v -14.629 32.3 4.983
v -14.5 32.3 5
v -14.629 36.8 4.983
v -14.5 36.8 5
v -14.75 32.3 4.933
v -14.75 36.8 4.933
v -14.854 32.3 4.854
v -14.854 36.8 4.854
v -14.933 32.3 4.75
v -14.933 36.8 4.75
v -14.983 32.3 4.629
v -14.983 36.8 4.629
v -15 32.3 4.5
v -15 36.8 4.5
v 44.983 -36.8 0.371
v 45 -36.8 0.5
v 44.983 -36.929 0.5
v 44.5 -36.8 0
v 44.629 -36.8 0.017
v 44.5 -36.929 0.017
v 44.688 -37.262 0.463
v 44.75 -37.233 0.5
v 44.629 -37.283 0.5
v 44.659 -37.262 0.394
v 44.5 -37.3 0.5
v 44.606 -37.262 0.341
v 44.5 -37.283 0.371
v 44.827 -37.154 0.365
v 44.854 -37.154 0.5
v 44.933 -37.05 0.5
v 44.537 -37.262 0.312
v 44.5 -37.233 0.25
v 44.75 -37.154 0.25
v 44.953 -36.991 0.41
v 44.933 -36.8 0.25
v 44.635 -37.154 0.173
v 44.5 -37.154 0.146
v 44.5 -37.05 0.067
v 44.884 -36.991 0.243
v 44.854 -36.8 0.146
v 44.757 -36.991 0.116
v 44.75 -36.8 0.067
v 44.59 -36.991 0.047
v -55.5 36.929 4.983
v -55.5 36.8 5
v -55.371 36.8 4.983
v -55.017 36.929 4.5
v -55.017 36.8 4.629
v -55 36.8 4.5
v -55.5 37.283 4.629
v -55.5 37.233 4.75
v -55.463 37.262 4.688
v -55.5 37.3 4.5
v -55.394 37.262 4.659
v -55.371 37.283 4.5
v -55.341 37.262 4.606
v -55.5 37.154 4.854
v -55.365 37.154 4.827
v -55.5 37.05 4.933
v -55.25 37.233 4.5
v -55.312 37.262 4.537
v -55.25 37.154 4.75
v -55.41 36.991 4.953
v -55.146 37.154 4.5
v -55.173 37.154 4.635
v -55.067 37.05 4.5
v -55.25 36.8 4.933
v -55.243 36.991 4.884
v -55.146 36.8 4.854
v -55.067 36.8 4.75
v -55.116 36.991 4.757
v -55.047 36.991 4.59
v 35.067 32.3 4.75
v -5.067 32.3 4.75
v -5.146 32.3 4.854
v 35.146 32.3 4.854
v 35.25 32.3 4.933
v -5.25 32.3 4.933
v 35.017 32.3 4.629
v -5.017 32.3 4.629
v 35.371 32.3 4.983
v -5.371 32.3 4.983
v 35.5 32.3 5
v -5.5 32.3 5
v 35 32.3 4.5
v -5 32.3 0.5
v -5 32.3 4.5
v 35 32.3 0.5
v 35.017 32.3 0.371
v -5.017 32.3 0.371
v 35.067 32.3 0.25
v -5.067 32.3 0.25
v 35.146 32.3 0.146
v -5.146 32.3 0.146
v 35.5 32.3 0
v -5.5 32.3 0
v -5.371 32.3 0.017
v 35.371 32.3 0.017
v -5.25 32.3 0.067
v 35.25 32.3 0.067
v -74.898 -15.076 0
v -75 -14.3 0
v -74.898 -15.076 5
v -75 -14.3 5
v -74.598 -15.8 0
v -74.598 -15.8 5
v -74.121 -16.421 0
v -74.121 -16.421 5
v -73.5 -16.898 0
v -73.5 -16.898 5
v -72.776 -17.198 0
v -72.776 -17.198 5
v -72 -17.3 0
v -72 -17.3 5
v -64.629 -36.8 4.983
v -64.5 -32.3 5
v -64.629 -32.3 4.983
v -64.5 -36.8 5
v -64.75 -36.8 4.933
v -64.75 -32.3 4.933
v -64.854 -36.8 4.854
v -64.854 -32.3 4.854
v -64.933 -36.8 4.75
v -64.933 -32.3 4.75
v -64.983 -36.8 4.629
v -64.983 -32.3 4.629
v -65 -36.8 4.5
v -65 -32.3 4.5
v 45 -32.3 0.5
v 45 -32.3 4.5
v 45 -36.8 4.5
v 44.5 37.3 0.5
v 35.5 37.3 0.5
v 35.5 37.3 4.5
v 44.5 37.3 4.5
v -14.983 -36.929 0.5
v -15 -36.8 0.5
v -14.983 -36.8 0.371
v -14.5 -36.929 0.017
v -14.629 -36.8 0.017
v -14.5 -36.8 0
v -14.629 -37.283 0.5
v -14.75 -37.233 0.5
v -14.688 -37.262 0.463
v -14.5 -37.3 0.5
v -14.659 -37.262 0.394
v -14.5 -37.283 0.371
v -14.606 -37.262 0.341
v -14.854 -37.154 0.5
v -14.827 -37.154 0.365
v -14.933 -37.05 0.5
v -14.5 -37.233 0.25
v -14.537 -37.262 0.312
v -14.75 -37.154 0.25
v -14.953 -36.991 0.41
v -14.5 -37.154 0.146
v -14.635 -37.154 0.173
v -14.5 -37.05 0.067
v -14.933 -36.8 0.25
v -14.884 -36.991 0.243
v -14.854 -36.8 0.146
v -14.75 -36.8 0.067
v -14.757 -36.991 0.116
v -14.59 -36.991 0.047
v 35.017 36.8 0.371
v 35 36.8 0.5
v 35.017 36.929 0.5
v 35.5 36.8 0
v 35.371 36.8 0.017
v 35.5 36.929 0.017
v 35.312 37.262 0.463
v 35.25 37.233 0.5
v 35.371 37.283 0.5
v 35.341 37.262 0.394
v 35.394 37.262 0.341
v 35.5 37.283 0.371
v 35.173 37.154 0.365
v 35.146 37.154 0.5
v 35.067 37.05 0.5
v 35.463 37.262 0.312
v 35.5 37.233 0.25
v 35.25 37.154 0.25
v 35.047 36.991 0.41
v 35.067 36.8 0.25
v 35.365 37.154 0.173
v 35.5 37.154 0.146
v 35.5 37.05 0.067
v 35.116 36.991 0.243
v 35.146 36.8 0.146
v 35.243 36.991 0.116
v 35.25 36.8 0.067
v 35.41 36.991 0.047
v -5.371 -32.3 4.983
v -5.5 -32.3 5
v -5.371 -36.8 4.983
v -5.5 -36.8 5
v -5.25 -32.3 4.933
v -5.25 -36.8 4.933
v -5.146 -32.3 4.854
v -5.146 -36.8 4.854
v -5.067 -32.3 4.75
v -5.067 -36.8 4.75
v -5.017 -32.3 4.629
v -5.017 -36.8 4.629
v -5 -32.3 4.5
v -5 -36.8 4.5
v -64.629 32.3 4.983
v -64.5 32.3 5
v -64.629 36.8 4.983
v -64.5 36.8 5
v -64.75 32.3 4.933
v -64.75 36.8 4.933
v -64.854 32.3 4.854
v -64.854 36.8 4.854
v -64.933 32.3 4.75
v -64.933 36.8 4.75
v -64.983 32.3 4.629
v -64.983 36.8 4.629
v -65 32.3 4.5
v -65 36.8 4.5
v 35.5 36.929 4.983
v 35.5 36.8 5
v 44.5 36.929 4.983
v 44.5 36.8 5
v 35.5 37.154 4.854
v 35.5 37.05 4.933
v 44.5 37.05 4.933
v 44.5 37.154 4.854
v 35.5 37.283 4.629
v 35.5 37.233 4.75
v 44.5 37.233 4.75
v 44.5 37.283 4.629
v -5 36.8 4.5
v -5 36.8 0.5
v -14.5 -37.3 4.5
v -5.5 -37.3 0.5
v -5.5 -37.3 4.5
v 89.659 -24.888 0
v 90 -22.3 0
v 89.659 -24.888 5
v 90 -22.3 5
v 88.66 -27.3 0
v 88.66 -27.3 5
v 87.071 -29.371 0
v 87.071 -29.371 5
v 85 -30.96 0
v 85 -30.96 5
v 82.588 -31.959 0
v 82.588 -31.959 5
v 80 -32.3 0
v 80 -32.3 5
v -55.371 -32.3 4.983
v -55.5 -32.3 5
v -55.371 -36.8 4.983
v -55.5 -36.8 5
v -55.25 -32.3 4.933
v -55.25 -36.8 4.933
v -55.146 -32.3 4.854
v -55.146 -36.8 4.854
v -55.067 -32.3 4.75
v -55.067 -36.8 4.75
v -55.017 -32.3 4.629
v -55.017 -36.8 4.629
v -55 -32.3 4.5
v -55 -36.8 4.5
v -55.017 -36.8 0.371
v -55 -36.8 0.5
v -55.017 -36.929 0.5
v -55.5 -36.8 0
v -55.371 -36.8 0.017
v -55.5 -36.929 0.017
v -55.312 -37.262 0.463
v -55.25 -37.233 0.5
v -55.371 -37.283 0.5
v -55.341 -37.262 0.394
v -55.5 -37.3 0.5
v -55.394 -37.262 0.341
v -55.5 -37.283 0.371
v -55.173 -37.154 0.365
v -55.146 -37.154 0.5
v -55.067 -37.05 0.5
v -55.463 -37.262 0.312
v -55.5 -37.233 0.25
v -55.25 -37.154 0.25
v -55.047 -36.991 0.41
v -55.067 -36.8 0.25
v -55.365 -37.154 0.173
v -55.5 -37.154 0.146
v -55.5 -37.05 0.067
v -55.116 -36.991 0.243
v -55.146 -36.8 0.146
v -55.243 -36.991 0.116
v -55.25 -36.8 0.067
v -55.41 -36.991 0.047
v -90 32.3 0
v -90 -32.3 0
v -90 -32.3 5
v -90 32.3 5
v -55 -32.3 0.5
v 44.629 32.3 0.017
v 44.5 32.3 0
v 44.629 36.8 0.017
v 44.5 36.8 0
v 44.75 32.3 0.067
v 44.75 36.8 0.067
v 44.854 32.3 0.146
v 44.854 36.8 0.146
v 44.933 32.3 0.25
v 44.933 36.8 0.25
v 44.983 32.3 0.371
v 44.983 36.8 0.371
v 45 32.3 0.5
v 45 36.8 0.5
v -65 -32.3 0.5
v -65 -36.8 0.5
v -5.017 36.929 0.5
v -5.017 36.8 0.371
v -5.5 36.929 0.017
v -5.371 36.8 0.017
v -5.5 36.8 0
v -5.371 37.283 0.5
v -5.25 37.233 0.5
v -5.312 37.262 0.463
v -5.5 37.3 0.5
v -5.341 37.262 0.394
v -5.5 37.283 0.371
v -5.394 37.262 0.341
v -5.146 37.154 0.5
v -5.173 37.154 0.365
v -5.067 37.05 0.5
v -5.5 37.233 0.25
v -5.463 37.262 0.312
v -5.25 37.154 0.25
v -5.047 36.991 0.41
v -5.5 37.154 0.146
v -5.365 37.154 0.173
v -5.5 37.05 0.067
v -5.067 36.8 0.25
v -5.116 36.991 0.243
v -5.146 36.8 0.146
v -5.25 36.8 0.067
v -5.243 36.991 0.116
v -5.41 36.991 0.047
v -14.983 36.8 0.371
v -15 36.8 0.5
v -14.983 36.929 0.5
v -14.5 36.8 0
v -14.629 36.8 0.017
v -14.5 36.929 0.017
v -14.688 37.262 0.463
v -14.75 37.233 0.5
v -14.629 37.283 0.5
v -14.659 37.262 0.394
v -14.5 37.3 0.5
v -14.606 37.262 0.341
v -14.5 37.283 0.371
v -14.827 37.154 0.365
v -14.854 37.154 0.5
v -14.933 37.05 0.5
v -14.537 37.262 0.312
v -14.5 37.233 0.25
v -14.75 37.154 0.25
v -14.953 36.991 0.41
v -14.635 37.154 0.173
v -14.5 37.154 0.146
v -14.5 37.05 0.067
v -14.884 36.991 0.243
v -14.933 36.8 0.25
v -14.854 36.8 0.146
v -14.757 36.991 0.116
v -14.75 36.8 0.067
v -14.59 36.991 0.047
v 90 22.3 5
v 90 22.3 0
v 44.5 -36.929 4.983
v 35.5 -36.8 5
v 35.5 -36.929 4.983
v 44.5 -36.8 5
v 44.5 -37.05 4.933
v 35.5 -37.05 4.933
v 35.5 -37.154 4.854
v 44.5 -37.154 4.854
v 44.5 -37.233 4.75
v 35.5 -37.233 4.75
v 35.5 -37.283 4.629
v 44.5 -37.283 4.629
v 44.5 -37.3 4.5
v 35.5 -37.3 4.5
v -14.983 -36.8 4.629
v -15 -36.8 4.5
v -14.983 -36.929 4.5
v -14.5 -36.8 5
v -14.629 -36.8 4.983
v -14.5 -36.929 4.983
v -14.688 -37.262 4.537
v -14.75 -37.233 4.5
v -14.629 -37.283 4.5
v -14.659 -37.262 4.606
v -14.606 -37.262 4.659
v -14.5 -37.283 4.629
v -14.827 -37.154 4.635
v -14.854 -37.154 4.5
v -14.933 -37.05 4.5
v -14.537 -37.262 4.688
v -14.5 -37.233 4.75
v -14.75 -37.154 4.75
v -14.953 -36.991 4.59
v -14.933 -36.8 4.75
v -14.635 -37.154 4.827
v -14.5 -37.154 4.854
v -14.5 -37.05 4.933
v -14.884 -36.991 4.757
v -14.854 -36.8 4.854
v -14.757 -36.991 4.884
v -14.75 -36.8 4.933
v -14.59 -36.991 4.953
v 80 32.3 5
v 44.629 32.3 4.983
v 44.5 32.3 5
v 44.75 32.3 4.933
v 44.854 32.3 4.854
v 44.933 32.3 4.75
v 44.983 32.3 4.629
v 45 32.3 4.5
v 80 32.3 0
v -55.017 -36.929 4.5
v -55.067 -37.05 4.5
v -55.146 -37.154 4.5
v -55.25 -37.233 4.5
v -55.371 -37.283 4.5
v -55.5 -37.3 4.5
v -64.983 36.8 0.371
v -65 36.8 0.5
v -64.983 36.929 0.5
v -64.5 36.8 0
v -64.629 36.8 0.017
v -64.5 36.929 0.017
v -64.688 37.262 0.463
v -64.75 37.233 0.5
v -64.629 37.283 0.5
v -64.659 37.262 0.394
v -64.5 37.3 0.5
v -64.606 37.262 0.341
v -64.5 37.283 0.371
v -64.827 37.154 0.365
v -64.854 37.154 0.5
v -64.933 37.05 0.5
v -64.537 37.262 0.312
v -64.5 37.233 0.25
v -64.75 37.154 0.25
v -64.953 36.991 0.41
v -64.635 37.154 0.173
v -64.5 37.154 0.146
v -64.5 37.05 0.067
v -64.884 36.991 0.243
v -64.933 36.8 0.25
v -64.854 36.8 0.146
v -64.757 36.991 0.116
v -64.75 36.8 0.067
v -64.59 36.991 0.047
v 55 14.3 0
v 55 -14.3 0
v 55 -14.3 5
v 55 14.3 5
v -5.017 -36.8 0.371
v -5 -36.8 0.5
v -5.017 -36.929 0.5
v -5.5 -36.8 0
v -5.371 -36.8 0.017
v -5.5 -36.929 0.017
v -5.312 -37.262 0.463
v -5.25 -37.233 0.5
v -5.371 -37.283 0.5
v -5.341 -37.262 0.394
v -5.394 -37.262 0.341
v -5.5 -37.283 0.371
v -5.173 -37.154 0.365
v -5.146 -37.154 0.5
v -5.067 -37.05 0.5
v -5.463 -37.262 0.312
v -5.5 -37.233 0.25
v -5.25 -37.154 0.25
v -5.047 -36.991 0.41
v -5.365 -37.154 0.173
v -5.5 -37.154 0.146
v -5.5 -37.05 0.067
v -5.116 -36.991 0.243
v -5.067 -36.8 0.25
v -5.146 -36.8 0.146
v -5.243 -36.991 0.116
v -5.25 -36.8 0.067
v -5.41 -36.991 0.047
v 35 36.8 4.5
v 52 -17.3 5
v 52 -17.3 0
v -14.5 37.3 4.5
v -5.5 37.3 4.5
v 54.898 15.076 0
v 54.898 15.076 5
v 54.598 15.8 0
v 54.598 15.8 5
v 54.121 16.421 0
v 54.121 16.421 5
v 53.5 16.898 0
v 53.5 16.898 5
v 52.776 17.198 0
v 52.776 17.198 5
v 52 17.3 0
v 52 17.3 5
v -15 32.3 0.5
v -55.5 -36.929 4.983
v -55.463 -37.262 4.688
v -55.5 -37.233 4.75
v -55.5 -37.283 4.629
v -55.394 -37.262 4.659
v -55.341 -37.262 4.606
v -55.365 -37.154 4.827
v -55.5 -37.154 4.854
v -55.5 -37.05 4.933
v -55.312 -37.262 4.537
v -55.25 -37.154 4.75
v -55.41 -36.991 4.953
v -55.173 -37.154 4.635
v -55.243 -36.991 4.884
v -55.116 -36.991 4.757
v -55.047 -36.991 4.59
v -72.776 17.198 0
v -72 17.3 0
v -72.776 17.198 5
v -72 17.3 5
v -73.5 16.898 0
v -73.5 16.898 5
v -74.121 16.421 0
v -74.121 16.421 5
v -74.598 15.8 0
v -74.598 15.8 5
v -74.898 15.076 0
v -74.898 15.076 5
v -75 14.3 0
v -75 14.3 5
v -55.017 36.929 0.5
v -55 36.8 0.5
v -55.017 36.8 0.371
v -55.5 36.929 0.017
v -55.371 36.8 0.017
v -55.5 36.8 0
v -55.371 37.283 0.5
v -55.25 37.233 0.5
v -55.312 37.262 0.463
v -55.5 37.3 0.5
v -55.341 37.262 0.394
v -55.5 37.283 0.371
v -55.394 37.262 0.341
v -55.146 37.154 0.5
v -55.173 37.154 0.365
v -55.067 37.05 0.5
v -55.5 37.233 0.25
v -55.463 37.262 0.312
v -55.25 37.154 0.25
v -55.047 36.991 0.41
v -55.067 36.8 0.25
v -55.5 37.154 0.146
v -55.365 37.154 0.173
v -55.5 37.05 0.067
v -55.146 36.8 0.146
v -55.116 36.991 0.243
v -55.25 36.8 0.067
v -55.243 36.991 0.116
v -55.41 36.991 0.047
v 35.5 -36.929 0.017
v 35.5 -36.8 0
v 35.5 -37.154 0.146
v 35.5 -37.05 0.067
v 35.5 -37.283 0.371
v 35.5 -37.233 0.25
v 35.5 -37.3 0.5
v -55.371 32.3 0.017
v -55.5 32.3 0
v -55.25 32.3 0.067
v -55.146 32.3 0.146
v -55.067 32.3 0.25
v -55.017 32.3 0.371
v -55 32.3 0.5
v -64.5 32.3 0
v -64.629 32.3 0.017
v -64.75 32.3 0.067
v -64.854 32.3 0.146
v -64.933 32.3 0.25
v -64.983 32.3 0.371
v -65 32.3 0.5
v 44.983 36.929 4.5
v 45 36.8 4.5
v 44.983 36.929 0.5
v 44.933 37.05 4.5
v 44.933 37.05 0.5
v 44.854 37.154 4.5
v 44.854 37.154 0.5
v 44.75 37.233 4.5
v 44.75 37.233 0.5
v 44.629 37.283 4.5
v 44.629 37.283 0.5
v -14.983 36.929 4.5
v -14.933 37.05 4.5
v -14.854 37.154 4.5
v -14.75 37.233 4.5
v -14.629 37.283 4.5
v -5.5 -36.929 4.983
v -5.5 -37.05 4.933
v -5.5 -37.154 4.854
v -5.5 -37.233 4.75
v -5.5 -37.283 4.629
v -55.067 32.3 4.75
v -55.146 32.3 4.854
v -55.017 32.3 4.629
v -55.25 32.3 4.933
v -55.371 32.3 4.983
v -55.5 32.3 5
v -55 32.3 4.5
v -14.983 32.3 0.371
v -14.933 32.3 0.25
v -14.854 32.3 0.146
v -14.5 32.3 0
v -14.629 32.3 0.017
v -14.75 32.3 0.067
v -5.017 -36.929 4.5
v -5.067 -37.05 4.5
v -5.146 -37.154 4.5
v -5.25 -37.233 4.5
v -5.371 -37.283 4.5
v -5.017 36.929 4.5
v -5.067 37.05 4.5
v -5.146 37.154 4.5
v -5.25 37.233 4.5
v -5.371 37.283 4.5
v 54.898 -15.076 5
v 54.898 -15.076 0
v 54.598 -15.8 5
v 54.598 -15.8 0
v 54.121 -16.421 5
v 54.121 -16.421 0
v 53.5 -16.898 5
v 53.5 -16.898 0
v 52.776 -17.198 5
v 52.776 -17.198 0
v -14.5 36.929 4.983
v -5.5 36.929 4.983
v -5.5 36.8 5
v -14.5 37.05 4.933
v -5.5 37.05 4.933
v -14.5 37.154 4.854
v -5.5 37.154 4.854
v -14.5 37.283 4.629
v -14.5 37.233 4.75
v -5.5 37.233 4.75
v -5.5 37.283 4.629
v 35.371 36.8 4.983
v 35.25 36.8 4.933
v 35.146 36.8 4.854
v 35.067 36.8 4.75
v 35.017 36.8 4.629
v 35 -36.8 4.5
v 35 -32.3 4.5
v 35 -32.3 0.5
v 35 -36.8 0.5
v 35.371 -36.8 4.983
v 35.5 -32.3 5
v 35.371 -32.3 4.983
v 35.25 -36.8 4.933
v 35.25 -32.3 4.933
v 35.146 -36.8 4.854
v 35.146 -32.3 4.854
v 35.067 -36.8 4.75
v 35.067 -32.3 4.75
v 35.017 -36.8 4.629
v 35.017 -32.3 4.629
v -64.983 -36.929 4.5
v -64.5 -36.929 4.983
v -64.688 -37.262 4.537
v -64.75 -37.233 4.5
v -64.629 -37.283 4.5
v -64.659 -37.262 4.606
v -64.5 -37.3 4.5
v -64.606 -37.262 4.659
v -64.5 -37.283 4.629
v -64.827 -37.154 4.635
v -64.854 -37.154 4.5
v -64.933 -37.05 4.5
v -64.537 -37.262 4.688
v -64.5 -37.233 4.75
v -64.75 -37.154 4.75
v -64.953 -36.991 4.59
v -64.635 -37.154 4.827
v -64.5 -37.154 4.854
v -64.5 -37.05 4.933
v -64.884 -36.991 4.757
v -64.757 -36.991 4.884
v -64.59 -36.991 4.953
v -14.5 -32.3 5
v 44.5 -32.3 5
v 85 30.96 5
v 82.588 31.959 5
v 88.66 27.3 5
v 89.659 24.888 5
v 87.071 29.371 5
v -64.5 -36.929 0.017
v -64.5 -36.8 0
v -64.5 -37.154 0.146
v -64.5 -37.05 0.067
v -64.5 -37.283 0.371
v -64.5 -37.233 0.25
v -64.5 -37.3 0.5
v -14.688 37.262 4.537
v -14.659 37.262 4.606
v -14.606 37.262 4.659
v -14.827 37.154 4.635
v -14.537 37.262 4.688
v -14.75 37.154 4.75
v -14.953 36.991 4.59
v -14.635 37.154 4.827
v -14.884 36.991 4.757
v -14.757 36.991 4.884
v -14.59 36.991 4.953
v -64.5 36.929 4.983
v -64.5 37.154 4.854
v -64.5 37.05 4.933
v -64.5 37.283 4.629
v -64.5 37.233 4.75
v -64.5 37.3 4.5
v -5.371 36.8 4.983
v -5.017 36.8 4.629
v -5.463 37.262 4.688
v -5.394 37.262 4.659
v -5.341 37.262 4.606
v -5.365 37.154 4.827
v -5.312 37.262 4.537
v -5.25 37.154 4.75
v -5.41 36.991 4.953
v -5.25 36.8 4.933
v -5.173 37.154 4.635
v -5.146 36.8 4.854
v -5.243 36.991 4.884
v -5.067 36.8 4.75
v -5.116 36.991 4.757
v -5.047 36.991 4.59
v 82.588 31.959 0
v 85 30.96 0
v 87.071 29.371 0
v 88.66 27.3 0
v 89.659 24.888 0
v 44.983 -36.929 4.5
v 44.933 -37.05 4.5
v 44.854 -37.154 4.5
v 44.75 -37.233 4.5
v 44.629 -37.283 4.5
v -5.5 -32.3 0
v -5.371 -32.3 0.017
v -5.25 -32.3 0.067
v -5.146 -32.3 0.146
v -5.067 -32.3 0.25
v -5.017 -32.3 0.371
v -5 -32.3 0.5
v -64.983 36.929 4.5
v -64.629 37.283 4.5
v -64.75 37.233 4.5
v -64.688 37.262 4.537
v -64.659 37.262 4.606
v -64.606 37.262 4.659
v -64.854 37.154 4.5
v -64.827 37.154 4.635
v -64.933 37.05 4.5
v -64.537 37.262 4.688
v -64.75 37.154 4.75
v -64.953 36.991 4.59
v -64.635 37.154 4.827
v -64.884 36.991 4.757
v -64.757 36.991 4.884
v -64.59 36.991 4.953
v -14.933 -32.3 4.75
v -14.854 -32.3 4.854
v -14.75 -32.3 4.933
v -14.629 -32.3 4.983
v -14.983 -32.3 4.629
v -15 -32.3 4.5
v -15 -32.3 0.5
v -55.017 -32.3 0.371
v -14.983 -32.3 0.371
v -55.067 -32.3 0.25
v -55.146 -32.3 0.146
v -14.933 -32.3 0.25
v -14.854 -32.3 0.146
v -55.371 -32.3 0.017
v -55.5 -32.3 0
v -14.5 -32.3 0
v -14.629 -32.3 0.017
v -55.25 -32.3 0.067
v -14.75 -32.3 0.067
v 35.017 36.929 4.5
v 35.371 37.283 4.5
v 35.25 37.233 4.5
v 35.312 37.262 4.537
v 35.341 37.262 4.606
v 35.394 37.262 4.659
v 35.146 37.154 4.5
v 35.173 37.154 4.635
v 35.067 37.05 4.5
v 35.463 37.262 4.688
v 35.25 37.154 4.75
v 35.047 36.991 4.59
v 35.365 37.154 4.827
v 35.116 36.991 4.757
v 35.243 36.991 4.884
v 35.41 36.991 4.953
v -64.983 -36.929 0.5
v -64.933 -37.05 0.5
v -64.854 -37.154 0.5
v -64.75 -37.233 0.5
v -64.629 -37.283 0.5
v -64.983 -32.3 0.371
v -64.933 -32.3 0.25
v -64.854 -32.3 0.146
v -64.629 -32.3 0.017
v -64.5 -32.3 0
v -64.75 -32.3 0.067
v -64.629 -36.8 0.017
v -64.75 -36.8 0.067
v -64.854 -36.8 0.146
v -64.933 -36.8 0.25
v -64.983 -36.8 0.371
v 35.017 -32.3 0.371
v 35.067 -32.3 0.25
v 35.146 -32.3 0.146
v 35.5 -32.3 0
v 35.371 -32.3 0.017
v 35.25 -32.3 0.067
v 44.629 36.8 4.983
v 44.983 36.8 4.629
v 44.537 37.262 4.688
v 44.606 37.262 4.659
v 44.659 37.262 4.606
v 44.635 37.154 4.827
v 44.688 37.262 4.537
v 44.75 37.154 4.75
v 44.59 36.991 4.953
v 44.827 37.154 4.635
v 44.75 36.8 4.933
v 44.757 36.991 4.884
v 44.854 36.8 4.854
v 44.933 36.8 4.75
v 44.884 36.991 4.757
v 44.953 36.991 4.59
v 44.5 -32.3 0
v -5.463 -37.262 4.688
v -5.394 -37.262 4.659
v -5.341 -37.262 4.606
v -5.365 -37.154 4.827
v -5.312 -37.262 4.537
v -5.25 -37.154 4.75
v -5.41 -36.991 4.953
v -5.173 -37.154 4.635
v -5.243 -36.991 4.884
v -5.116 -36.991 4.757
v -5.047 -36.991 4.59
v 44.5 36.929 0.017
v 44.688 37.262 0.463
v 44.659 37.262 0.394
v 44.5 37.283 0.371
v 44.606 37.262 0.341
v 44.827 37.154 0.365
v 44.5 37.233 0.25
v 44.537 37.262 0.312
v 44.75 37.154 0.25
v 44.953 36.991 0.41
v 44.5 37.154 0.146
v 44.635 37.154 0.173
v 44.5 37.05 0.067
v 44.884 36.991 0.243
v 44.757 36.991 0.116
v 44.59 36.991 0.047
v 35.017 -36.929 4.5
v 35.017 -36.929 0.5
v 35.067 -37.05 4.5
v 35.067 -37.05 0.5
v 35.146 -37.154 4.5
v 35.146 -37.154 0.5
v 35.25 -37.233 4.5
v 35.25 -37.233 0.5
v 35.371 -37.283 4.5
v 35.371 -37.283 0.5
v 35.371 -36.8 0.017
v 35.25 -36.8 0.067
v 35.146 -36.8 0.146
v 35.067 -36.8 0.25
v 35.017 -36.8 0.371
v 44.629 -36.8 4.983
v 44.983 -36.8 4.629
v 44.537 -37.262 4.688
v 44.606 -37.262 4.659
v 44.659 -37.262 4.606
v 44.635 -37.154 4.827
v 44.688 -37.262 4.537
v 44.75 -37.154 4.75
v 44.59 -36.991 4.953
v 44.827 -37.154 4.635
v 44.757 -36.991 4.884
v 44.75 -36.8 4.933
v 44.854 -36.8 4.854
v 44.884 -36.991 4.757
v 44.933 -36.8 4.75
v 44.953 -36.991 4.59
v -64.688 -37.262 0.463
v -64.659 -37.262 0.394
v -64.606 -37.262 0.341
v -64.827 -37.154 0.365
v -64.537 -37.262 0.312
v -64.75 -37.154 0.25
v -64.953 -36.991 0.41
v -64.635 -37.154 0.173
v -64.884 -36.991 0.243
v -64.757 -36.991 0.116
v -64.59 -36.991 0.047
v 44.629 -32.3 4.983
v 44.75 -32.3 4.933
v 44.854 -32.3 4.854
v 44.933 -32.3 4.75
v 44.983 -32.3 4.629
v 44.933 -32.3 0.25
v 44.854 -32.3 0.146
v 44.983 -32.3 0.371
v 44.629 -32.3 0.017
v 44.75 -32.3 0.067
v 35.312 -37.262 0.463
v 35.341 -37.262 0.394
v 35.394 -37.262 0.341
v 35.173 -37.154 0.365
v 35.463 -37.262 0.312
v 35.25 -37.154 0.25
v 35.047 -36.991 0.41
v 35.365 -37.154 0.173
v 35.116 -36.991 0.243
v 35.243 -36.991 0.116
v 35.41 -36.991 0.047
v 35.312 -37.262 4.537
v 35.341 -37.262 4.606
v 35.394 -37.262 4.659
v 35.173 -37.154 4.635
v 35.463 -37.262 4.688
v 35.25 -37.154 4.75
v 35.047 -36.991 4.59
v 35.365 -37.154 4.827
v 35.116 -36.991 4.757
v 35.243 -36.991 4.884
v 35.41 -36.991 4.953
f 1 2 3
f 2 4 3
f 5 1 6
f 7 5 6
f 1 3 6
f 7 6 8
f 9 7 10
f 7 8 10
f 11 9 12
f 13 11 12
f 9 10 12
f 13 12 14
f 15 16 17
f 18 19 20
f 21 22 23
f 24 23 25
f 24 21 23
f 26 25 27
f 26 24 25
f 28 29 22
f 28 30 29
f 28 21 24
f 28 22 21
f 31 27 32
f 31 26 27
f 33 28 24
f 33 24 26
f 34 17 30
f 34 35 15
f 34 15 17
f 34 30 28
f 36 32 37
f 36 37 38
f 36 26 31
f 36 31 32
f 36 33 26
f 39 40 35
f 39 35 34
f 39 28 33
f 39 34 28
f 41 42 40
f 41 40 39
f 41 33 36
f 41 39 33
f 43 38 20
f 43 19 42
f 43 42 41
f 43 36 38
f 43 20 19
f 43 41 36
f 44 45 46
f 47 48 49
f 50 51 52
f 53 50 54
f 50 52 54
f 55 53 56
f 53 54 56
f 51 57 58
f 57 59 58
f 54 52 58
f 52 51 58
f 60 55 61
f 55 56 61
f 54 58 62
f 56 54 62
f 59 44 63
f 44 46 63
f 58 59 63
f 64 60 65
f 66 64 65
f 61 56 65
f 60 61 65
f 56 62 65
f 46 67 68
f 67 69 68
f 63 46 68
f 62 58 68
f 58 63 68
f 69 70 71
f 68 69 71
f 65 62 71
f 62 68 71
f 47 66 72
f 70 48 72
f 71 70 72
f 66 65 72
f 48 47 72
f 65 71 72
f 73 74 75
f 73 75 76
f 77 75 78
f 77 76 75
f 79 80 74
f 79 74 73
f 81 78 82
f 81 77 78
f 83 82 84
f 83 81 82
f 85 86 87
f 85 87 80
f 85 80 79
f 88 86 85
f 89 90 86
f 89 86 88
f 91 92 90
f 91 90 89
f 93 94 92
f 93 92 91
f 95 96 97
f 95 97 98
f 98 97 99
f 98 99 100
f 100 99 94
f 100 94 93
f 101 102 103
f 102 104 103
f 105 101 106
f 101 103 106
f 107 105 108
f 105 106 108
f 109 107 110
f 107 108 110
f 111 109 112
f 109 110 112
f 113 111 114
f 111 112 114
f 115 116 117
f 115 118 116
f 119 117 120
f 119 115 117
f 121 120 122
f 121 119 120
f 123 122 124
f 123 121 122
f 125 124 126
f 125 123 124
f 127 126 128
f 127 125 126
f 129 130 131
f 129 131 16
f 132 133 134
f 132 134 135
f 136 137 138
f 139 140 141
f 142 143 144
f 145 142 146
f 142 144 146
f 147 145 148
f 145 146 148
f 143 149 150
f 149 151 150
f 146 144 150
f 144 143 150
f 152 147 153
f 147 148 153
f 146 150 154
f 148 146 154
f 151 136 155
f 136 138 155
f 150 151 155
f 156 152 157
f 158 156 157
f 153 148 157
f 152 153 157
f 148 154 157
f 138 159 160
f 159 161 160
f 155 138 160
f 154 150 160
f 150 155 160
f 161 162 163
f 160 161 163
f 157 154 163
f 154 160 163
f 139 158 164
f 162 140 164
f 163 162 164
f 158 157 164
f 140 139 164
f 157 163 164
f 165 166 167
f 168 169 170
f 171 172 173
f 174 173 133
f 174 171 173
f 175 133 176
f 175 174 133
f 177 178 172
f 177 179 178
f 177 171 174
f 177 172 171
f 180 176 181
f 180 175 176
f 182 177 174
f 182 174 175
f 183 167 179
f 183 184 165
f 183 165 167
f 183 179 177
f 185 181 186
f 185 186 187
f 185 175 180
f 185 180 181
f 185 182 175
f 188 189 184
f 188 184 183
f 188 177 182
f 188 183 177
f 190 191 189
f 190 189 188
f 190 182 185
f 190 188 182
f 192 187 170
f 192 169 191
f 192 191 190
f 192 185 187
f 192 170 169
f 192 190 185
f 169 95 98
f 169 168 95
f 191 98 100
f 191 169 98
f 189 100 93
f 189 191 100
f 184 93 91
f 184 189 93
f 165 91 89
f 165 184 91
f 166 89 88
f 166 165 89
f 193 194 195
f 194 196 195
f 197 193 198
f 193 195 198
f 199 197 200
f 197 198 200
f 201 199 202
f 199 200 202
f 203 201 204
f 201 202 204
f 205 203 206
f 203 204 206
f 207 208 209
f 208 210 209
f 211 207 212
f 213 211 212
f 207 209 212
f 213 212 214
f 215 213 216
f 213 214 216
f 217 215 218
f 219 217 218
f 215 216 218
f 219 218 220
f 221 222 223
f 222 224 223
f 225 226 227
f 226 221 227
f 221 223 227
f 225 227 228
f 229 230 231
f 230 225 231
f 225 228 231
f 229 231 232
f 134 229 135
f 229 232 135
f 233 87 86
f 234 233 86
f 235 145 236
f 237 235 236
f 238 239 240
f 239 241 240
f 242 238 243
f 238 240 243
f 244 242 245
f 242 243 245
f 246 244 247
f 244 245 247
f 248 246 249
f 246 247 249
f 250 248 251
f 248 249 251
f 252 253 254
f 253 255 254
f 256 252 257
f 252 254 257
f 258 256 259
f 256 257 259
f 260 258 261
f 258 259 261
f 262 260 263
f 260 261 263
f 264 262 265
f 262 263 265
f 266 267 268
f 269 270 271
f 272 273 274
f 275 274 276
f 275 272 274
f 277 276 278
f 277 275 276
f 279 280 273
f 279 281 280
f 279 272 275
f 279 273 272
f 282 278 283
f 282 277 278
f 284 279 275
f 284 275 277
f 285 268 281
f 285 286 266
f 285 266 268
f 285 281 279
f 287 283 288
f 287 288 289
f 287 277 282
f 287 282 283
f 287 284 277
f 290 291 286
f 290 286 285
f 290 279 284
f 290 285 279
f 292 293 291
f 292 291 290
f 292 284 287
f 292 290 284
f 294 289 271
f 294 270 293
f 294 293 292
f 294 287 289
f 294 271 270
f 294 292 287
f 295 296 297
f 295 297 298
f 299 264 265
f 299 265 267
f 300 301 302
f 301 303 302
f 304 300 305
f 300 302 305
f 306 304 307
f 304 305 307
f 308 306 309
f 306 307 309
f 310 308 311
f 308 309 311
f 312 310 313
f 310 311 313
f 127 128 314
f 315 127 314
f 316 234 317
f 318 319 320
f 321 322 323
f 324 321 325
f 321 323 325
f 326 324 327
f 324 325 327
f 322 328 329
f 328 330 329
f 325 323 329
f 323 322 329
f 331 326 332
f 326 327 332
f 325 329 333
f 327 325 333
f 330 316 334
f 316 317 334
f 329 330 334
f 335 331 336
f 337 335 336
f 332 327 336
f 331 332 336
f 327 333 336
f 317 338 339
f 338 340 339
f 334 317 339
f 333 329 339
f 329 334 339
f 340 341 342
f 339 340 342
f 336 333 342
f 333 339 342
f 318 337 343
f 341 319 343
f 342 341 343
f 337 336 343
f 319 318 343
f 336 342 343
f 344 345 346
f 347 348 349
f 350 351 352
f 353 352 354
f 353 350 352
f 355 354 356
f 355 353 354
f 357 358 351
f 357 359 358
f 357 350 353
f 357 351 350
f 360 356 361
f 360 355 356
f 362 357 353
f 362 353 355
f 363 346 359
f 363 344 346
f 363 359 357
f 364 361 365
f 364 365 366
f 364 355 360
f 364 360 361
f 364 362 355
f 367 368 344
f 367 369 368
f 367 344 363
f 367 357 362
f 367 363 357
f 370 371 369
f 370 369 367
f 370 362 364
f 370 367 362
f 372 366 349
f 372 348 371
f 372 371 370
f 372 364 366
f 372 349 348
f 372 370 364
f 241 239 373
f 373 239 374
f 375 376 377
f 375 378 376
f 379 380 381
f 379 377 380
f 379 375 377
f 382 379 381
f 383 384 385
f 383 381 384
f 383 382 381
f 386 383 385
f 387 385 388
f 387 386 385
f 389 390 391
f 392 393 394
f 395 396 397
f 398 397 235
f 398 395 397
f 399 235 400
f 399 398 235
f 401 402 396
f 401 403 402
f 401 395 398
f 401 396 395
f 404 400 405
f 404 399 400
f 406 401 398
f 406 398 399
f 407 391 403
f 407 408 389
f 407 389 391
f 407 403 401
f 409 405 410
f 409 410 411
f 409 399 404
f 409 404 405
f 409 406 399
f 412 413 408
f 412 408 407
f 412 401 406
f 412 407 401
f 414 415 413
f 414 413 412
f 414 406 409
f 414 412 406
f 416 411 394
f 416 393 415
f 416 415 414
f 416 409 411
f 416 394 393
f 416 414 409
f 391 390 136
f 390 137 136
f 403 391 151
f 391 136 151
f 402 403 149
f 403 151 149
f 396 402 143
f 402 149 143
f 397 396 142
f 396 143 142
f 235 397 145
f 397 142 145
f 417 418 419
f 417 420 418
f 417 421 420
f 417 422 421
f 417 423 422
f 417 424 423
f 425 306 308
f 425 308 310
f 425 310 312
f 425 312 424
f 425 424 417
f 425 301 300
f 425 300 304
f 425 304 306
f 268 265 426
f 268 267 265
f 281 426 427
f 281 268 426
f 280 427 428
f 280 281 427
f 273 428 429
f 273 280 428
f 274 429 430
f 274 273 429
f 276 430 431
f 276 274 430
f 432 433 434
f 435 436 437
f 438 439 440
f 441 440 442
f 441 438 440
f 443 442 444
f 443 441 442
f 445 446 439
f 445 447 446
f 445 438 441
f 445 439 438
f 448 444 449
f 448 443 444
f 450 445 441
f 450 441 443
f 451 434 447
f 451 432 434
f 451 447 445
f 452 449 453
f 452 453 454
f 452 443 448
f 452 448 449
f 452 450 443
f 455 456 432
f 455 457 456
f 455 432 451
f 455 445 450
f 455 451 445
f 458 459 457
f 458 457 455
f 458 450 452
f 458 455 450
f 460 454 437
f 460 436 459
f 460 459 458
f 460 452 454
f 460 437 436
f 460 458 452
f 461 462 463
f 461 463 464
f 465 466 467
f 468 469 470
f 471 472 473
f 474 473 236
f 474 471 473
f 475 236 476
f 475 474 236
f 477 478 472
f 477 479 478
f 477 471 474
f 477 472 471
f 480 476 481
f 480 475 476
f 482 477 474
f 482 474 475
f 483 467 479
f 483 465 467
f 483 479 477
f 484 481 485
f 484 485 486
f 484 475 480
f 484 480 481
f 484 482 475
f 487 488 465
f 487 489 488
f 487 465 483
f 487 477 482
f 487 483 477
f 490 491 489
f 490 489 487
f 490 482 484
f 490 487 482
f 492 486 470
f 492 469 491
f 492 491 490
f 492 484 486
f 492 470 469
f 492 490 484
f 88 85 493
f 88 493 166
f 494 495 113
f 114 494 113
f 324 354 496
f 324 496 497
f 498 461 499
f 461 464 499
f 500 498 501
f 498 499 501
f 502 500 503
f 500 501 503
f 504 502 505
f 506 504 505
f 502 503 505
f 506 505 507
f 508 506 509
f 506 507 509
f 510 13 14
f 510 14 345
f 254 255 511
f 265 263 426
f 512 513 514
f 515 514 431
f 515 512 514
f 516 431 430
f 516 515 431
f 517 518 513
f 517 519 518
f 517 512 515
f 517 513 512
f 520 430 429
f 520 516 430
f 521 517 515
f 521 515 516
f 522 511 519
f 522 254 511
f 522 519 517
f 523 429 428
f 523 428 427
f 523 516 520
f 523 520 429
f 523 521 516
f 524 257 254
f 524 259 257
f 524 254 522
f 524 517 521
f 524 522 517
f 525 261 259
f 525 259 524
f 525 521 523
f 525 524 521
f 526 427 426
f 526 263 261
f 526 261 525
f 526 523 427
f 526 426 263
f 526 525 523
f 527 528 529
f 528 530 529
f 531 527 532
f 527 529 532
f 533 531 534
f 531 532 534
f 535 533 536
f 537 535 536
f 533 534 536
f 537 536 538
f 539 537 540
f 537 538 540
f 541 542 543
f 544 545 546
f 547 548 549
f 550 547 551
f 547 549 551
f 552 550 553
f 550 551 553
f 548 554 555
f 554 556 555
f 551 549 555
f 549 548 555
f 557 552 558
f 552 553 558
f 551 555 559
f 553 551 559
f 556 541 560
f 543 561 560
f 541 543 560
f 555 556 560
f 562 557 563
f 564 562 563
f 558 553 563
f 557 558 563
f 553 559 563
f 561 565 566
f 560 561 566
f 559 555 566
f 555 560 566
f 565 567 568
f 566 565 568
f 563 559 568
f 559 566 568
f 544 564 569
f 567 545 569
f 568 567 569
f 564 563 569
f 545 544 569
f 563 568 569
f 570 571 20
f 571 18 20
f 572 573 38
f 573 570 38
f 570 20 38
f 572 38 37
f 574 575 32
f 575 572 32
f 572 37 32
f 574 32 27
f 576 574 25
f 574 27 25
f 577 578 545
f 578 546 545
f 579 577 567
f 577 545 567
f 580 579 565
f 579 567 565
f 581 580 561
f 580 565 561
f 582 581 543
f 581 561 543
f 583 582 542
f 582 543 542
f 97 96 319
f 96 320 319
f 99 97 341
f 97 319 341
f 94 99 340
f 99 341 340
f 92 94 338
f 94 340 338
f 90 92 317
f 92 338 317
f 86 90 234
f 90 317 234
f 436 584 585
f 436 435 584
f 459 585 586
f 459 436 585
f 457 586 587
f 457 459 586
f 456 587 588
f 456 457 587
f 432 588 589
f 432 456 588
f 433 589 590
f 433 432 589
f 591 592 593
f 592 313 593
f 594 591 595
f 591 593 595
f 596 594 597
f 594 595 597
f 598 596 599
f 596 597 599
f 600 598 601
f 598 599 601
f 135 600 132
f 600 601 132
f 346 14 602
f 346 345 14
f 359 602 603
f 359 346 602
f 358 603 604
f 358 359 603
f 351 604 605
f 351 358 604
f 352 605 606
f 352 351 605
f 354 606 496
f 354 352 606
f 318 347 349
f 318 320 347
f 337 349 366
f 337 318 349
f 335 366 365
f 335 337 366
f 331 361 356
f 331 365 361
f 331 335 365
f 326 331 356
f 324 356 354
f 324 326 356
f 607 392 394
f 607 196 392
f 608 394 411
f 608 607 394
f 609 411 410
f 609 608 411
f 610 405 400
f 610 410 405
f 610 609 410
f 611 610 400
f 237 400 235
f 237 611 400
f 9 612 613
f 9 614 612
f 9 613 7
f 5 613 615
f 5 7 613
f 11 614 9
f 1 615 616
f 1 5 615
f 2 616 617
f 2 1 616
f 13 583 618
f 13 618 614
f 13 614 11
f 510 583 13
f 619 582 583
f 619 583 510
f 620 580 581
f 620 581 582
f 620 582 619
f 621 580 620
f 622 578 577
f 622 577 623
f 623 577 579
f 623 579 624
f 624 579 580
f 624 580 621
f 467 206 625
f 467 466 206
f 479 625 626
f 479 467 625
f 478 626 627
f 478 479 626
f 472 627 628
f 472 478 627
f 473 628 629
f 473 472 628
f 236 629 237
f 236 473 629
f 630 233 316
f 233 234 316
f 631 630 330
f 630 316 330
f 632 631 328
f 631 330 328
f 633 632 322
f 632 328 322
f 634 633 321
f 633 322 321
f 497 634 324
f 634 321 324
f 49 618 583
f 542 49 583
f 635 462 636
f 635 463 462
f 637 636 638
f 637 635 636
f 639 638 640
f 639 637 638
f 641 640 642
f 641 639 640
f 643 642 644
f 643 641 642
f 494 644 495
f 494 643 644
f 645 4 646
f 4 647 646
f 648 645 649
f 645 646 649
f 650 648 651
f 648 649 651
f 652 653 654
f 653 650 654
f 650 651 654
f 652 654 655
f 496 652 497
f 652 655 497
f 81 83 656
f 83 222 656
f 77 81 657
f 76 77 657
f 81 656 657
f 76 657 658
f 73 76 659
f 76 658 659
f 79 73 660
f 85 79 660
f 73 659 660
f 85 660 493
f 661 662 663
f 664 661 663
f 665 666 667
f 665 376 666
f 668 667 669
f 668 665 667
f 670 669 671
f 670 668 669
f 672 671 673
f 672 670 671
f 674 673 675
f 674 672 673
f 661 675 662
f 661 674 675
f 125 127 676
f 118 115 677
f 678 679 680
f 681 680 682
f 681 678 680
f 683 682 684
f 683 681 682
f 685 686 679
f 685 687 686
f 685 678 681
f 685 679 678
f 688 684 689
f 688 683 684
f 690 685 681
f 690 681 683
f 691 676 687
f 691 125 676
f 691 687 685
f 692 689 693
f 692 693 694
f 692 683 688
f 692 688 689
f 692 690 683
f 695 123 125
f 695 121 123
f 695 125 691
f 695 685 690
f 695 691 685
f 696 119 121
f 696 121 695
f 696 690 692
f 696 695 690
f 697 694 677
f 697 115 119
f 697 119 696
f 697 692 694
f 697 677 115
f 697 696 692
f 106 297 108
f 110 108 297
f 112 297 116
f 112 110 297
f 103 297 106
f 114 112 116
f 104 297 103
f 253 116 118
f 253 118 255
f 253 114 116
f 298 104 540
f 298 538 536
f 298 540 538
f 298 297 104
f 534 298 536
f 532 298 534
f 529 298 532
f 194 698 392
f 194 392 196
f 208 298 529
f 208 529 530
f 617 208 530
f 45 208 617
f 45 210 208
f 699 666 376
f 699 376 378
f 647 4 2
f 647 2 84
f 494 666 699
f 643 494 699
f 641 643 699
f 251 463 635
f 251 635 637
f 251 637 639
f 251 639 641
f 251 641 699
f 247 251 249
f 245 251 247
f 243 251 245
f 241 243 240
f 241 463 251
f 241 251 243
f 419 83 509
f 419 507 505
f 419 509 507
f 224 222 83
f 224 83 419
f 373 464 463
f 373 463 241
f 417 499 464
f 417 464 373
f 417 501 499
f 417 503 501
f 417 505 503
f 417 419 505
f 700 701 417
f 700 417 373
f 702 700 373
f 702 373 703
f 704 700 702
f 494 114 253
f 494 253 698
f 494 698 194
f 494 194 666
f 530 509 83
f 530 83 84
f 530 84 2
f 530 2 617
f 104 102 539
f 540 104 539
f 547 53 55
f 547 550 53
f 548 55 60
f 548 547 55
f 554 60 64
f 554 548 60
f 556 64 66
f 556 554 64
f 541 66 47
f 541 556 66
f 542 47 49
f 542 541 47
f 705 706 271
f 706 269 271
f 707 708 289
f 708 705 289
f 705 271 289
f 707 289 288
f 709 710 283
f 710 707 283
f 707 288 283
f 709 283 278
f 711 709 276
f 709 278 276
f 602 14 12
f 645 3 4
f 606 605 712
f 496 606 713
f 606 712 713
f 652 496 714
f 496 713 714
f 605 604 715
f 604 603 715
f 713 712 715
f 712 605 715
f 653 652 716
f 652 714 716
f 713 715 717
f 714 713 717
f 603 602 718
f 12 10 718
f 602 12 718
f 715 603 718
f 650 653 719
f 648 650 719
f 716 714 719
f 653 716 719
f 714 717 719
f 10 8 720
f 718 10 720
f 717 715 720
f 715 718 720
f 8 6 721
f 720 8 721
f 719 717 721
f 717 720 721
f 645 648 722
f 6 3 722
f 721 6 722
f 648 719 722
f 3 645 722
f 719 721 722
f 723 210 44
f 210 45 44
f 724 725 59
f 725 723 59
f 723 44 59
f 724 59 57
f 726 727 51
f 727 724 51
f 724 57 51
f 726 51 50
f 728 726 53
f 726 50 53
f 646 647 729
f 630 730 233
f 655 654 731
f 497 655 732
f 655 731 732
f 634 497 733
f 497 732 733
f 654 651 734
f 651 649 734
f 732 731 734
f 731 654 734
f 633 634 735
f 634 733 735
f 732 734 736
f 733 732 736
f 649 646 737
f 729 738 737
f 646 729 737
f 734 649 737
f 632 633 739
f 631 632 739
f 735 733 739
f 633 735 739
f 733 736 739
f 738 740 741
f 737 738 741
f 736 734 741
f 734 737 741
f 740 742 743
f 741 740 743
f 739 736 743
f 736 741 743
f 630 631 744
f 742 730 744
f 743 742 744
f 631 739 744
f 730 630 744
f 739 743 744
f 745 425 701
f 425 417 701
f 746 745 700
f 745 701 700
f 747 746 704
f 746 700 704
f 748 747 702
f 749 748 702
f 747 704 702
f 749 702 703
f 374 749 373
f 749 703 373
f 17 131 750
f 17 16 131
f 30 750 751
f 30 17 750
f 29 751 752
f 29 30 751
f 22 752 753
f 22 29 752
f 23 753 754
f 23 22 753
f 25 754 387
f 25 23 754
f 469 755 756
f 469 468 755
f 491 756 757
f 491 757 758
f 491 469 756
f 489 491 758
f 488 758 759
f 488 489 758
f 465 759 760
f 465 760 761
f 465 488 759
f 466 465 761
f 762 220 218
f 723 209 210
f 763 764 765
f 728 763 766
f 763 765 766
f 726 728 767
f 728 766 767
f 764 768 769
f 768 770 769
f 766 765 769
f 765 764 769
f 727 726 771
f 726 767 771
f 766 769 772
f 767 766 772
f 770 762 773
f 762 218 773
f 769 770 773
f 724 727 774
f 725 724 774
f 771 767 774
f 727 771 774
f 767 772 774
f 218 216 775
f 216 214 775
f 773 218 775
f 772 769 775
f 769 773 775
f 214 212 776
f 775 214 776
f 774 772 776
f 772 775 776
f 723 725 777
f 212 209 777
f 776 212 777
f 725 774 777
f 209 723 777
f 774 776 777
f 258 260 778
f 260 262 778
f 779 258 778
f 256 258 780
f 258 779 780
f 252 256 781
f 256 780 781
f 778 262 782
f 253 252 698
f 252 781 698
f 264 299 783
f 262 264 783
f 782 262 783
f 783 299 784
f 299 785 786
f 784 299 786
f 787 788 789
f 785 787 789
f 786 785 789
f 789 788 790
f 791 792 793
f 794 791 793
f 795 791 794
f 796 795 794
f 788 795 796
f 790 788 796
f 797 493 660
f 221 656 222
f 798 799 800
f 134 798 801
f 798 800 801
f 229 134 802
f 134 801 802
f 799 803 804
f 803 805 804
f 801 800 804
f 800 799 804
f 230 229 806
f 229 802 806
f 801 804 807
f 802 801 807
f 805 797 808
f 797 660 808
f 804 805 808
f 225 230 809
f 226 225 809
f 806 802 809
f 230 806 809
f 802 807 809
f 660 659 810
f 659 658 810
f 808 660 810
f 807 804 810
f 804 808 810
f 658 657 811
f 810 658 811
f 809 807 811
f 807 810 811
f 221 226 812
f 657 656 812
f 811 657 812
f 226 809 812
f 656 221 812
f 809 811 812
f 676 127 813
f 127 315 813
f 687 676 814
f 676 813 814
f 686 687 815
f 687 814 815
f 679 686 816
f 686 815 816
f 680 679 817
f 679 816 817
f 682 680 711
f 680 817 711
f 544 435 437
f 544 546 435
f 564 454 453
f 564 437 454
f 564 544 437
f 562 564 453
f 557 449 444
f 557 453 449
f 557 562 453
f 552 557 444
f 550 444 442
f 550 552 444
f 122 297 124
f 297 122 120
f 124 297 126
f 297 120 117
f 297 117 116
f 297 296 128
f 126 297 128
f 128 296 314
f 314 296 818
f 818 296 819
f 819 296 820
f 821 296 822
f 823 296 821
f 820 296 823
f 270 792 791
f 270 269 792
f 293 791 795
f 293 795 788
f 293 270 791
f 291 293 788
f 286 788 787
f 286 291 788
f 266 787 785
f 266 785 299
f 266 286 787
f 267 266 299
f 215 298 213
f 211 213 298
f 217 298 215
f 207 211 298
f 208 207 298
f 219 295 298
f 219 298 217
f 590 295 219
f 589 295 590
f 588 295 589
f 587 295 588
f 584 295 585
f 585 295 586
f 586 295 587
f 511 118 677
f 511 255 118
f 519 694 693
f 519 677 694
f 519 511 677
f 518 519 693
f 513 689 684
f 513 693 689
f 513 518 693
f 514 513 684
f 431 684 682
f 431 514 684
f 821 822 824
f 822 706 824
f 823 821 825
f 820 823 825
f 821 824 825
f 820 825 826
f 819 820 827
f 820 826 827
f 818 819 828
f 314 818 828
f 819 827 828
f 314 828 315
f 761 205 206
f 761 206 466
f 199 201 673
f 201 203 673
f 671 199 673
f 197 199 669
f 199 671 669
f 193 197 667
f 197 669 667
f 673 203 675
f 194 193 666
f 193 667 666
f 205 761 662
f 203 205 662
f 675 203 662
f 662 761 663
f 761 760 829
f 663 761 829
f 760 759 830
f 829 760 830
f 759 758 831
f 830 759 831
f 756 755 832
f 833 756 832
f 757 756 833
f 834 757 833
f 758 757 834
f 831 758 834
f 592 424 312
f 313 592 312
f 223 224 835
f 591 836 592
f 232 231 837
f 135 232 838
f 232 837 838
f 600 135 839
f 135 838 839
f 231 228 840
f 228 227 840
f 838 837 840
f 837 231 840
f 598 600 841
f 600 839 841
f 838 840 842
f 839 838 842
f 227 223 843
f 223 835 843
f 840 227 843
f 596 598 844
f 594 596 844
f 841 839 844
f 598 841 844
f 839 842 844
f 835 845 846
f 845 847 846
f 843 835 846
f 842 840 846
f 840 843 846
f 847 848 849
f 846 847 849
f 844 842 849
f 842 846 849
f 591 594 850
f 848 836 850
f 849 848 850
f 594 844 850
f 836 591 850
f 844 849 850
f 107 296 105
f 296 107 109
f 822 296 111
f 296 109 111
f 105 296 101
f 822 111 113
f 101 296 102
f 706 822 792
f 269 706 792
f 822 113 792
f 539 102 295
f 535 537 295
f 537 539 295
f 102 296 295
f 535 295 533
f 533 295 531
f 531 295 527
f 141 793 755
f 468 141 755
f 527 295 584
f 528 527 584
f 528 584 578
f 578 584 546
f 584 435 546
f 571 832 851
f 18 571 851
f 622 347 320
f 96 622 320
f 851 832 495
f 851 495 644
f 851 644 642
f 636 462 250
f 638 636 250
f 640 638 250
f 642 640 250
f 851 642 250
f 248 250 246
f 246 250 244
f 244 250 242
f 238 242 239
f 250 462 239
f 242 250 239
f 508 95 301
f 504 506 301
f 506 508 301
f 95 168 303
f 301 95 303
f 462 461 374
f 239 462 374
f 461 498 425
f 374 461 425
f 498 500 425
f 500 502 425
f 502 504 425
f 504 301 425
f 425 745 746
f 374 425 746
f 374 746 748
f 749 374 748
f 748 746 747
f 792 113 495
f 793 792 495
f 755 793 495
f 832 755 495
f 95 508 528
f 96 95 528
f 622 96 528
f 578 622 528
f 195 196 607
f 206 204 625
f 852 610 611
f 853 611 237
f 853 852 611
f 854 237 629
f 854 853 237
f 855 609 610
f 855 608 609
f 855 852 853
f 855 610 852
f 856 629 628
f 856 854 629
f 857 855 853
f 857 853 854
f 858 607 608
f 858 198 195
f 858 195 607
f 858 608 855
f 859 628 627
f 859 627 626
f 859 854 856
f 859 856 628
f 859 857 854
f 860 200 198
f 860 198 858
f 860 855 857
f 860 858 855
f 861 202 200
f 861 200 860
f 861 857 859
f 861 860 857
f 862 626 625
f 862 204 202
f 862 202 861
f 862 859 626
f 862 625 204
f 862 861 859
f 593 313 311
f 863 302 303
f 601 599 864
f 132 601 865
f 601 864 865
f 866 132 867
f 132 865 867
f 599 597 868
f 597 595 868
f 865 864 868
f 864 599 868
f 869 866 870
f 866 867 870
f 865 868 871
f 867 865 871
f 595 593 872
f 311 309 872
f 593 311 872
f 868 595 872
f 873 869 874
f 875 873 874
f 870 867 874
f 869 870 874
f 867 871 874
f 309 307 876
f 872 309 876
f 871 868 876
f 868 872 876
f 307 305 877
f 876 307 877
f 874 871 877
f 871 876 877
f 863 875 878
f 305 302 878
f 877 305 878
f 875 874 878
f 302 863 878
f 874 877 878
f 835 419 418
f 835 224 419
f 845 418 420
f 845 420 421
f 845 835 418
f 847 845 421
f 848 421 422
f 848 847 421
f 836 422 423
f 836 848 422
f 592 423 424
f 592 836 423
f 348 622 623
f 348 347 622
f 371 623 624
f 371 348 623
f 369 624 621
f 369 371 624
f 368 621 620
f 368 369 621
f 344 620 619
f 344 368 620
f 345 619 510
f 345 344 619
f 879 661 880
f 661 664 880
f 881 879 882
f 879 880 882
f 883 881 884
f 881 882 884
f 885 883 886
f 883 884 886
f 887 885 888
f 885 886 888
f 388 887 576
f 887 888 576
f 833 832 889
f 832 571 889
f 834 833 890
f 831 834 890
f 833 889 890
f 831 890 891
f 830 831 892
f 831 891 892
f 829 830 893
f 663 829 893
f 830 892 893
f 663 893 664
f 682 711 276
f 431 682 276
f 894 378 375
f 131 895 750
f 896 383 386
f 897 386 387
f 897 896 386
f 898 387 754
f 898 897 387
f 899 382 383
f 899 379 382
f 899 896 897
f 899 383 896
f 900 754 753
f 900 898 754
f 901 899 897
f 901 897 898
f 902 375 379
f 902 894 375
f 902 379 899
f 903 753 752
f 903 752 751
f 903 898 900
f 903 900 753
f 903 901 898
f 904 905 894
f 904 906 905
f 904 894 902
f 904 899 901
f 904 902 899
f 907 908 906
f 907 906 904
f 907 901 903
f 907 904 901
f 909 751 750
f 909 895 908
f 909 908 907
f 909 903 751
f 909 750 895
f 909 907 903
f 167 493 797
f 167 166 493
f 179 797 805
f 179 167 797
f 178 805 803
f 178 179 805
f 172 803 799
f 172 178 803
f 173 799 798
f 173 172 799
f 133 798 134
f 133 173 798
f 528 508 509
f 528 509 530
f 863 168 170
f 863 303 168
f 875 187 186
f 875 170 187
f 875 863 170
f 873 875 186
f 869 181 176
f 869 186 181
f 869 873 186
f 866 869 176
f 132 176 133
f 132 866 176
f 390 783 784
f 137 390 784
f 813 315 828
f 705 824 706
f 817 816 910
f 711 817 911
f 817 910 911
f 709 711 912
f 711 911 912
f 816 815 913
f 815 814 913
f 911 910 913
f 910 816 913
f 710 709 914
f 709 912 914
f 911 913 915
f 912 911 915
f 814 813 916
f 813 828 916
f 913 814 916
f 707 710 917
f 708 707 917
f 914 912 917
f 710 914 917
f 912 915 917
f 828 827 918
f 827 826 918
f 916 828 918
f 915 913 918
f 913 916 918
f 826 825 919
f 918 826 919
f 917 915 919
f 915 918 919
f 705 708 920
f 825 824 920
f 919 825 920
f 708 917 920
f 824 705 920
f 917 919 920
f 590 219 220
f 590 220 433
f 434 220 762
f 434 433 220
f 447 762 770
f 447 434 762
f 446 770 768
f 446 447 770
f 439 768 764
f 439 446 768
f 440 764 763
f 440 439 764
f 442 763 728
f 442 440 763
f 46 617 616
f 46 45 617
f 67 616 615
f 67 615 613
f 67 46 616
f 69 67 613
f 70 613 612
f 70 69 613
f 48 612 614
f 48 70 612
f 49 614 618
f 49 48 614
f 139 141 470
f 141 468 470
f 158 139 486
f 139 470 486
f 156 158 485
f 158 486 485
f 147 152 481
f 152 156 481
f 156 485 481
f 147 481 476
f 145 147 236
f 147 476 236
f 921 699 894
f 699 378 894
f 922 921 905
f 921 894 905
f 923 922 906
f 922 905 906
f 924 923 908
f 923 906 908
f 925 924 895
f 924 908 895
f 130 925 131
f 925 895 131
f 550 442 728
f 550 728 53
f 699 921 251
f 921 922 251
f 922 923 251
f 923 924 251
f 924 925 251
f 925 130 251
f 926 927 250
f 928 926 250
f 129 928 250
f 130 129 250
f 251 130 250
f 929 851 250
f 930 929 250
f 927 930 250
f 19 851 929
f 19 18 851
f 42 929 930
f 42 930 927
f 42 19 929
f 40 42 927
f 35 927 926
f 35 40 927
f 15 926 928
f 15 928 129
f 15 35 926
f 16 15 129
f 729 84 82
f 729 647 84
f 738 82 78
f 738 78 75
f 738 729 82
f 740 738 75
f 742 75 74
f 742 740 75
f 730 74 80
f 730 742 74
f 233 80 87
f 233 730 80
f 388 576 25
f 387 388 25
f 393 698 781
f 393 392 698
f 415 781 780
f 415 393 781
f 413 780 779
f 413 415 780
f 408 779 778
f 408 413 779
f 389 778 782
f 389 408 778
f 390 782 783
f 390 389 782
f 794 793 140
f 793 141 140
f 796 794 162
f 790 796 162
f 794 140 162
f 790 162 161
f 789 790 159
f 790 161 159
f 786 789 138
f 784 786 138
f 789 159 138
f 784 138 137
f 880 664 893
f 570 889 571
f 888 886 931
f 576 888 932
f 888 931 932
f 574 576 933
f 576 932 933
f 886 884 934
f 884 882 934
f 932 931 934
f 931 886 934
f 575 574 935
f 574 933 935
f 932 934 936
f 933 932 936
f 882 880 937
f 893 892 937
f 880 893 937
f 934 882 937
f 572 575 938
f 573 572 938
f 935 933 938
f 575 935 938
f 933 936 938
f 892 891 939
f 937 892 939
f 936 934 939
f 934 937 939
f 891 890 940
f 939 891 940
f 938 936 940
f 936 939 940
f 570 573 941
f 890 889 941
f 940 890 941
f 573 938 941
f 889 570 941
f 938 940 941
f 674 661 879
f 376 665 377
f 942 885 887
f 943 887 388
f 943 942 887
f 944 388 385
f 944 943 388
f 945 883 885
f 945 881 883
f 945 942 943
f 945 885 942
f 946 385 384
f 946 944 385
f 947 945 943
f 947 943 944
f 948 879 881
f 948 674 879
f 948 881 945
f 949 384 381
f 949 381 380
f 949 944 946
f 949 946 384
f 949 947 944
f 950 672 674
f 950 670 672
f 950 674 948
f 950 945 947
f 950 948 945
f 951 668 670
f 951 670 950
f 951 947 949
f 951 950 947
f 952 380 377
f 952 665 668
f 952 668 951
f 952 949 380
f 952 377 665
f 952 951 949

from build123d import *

# Parameters (mm, degrees)
CROQUIS1_W               = 180
CROQUIS1_H               = 64.6
SALIENTE_EXTRUIR1_DEPTH  = 5
CROQUIS2_W               = 10
CROQUIS2_H               = 5
SALIENTE_EXTRUIR2_DEPTH  = 5
REDONDEO1_R              = 0.5
REDONDEO1_OF_SIMETR_A1_R = 0.5
REDONDEO2_R              = 10
CROQUIS3_W               = 130
CROQUIS3_H               = 34.6
CORTAR_EXTRUIR1_DEPTH    = 5
REDONDEO3_R              = 3


with BuildPart() as part:
    # Croquis1 → Saliente-Extruir1 (new body)
    with BuildSketch(Plane.XY):
        Rectangle(CROQUIS1_W, CROQUIS1_H)
    extrude(amount=SALIENTE_EXTRUIR1_DEPTH)

    # Croquis2 → Saliente-Extruir2 (add)
    with BuildSketch(Plane(origin=(0, 32.3, 0), x_dir=(1, 0, 0), z_dir=(0, 1, 0))):
        with Locations((-60, -2.5)):
            Rectangle(CROQUIS2_W, CROQUIS2_H)
        with Locations((-10, -2.5)):
            Rectangle(CROQUIS2_W, CROQUIS2_H)
        with Locations((40, -2.5)):
            Rectangle(CROQUIS2_W, CROQUIS2_H)
    saliente_extruir2 = extrude(amount=SALIENTE_EXTRUIR2_DEPTH)

    # Redondeo1
    redondeo1_edges = [part.edges().sort_by_distance(p)[0] for p in [
        (-65, 34.8, 0),
        (-65, 34.8, 5),
        (-55, 34.8, 5),
        (-55, 34.8, 0),
        (-65, 37.3, 2.5),
        (-60, 37.3, 5),
        (-55, 37.3, 2.5),
        (-60, 37.3, 0),
        (-15, 34.8, 0),
        (-15, 34.8, 5),
        (-5, 34.8, 5),
        (-5, 34.8, 0),
        (-15, 37.3, 2.5),
        (-10, 37.3, 5),
        (-5, 37.3, 2.5),
        (-10, 37.3, 0),
        (35, 34.8, 0),
        (35, 34.8, 5),
        (45, 34.8, 5),
        (45, 34.8, 0),
        (35, 37.3, 2.5),
        (40, 37.3, 5),
        (45, 37.3, 2.5),
        (40, 37.3, 0),
    ]]
    fillet(redondeo1_edges, radius=REDONDEO1_R)

    # Simetría1: Saliente-Extruir2 across plane
    add(saliente_extruir2.mirror(Plane.ZX))

    # Redondeo1 of Simetría1
    redondeo1_of_simetr_a1_edges = [part.edges().sort_by_distance(p)[0] for p in [
        (-65, -34.8, 0),
        (-65, -34.8, 5),
        (-55, -34.8, 5),
        (-55, -34.8, 0),
        (-65, -37.3, 2.5),
        (-60, -37.3, 5),
        (-55, -37.3, 2.5),
        (-60, -37.3, 0),
        (-15, -34.8, 0),
        (-15, -34.8, 5),
        (-5, -34.8, 5),
        (-5, -34.8, 0),
        (-15, -37.3, 2.5),
        (-10, -37.3, 5),
        (-5, -37.3, 2.5),
        (-10, -37.3, 0),
        (35, -34.8, 0),
        (35, -34.8, 5),
        (45, -34.8, 5),
        (45, -34.8, 0),
        (35, -37.3, 2.5),
        (40, -37.3, 5),
        (45, -37.3, 2.5),
        (40, -37.3, 0),
    ]]
    fillet(redondeo1_of_simetr_a1_edges, radius=REDONDEO1_OF_SIMETR_A1_R)

    # Redondeo2
    redondeo2_edges = [part.edges().sort_by_distance(p)[0] for p in [
        (90, 32.3, 2.5),
        (90, -32.3, 2.5),
    ]]
    fillet(redondeo2_edges, radius=REDONDEO2_R)

    # Croquis3 → Cortar-Extruir1 (cut)
    with BuildSketch(Plane(origin=(0, 0, 0), x_dir=(-1, 0, 0), z_dir=(0, 0, -1))):
        with Locations((10, 0)):
            Rectangle(CROQUIS3_W, CROQUIS3_H)
    extrude(amount=-CORTAR_EXTRUIR1_DEPTH, mode=Mode.SUBTRACT)

    # Redondeo3
    redondeo3_edges = [part.edges().sort_by_distance(p)[0] for p in [
        (55, -17.3, 2.5),
        (55, 17.3, 2.5),
        (-75, 17.3, 2.5),
        (-75, -17.3, 2.5),
    ]]
    fillet(redondeo3_edges, radius=REDONDEO3_R)


solid = part.part
